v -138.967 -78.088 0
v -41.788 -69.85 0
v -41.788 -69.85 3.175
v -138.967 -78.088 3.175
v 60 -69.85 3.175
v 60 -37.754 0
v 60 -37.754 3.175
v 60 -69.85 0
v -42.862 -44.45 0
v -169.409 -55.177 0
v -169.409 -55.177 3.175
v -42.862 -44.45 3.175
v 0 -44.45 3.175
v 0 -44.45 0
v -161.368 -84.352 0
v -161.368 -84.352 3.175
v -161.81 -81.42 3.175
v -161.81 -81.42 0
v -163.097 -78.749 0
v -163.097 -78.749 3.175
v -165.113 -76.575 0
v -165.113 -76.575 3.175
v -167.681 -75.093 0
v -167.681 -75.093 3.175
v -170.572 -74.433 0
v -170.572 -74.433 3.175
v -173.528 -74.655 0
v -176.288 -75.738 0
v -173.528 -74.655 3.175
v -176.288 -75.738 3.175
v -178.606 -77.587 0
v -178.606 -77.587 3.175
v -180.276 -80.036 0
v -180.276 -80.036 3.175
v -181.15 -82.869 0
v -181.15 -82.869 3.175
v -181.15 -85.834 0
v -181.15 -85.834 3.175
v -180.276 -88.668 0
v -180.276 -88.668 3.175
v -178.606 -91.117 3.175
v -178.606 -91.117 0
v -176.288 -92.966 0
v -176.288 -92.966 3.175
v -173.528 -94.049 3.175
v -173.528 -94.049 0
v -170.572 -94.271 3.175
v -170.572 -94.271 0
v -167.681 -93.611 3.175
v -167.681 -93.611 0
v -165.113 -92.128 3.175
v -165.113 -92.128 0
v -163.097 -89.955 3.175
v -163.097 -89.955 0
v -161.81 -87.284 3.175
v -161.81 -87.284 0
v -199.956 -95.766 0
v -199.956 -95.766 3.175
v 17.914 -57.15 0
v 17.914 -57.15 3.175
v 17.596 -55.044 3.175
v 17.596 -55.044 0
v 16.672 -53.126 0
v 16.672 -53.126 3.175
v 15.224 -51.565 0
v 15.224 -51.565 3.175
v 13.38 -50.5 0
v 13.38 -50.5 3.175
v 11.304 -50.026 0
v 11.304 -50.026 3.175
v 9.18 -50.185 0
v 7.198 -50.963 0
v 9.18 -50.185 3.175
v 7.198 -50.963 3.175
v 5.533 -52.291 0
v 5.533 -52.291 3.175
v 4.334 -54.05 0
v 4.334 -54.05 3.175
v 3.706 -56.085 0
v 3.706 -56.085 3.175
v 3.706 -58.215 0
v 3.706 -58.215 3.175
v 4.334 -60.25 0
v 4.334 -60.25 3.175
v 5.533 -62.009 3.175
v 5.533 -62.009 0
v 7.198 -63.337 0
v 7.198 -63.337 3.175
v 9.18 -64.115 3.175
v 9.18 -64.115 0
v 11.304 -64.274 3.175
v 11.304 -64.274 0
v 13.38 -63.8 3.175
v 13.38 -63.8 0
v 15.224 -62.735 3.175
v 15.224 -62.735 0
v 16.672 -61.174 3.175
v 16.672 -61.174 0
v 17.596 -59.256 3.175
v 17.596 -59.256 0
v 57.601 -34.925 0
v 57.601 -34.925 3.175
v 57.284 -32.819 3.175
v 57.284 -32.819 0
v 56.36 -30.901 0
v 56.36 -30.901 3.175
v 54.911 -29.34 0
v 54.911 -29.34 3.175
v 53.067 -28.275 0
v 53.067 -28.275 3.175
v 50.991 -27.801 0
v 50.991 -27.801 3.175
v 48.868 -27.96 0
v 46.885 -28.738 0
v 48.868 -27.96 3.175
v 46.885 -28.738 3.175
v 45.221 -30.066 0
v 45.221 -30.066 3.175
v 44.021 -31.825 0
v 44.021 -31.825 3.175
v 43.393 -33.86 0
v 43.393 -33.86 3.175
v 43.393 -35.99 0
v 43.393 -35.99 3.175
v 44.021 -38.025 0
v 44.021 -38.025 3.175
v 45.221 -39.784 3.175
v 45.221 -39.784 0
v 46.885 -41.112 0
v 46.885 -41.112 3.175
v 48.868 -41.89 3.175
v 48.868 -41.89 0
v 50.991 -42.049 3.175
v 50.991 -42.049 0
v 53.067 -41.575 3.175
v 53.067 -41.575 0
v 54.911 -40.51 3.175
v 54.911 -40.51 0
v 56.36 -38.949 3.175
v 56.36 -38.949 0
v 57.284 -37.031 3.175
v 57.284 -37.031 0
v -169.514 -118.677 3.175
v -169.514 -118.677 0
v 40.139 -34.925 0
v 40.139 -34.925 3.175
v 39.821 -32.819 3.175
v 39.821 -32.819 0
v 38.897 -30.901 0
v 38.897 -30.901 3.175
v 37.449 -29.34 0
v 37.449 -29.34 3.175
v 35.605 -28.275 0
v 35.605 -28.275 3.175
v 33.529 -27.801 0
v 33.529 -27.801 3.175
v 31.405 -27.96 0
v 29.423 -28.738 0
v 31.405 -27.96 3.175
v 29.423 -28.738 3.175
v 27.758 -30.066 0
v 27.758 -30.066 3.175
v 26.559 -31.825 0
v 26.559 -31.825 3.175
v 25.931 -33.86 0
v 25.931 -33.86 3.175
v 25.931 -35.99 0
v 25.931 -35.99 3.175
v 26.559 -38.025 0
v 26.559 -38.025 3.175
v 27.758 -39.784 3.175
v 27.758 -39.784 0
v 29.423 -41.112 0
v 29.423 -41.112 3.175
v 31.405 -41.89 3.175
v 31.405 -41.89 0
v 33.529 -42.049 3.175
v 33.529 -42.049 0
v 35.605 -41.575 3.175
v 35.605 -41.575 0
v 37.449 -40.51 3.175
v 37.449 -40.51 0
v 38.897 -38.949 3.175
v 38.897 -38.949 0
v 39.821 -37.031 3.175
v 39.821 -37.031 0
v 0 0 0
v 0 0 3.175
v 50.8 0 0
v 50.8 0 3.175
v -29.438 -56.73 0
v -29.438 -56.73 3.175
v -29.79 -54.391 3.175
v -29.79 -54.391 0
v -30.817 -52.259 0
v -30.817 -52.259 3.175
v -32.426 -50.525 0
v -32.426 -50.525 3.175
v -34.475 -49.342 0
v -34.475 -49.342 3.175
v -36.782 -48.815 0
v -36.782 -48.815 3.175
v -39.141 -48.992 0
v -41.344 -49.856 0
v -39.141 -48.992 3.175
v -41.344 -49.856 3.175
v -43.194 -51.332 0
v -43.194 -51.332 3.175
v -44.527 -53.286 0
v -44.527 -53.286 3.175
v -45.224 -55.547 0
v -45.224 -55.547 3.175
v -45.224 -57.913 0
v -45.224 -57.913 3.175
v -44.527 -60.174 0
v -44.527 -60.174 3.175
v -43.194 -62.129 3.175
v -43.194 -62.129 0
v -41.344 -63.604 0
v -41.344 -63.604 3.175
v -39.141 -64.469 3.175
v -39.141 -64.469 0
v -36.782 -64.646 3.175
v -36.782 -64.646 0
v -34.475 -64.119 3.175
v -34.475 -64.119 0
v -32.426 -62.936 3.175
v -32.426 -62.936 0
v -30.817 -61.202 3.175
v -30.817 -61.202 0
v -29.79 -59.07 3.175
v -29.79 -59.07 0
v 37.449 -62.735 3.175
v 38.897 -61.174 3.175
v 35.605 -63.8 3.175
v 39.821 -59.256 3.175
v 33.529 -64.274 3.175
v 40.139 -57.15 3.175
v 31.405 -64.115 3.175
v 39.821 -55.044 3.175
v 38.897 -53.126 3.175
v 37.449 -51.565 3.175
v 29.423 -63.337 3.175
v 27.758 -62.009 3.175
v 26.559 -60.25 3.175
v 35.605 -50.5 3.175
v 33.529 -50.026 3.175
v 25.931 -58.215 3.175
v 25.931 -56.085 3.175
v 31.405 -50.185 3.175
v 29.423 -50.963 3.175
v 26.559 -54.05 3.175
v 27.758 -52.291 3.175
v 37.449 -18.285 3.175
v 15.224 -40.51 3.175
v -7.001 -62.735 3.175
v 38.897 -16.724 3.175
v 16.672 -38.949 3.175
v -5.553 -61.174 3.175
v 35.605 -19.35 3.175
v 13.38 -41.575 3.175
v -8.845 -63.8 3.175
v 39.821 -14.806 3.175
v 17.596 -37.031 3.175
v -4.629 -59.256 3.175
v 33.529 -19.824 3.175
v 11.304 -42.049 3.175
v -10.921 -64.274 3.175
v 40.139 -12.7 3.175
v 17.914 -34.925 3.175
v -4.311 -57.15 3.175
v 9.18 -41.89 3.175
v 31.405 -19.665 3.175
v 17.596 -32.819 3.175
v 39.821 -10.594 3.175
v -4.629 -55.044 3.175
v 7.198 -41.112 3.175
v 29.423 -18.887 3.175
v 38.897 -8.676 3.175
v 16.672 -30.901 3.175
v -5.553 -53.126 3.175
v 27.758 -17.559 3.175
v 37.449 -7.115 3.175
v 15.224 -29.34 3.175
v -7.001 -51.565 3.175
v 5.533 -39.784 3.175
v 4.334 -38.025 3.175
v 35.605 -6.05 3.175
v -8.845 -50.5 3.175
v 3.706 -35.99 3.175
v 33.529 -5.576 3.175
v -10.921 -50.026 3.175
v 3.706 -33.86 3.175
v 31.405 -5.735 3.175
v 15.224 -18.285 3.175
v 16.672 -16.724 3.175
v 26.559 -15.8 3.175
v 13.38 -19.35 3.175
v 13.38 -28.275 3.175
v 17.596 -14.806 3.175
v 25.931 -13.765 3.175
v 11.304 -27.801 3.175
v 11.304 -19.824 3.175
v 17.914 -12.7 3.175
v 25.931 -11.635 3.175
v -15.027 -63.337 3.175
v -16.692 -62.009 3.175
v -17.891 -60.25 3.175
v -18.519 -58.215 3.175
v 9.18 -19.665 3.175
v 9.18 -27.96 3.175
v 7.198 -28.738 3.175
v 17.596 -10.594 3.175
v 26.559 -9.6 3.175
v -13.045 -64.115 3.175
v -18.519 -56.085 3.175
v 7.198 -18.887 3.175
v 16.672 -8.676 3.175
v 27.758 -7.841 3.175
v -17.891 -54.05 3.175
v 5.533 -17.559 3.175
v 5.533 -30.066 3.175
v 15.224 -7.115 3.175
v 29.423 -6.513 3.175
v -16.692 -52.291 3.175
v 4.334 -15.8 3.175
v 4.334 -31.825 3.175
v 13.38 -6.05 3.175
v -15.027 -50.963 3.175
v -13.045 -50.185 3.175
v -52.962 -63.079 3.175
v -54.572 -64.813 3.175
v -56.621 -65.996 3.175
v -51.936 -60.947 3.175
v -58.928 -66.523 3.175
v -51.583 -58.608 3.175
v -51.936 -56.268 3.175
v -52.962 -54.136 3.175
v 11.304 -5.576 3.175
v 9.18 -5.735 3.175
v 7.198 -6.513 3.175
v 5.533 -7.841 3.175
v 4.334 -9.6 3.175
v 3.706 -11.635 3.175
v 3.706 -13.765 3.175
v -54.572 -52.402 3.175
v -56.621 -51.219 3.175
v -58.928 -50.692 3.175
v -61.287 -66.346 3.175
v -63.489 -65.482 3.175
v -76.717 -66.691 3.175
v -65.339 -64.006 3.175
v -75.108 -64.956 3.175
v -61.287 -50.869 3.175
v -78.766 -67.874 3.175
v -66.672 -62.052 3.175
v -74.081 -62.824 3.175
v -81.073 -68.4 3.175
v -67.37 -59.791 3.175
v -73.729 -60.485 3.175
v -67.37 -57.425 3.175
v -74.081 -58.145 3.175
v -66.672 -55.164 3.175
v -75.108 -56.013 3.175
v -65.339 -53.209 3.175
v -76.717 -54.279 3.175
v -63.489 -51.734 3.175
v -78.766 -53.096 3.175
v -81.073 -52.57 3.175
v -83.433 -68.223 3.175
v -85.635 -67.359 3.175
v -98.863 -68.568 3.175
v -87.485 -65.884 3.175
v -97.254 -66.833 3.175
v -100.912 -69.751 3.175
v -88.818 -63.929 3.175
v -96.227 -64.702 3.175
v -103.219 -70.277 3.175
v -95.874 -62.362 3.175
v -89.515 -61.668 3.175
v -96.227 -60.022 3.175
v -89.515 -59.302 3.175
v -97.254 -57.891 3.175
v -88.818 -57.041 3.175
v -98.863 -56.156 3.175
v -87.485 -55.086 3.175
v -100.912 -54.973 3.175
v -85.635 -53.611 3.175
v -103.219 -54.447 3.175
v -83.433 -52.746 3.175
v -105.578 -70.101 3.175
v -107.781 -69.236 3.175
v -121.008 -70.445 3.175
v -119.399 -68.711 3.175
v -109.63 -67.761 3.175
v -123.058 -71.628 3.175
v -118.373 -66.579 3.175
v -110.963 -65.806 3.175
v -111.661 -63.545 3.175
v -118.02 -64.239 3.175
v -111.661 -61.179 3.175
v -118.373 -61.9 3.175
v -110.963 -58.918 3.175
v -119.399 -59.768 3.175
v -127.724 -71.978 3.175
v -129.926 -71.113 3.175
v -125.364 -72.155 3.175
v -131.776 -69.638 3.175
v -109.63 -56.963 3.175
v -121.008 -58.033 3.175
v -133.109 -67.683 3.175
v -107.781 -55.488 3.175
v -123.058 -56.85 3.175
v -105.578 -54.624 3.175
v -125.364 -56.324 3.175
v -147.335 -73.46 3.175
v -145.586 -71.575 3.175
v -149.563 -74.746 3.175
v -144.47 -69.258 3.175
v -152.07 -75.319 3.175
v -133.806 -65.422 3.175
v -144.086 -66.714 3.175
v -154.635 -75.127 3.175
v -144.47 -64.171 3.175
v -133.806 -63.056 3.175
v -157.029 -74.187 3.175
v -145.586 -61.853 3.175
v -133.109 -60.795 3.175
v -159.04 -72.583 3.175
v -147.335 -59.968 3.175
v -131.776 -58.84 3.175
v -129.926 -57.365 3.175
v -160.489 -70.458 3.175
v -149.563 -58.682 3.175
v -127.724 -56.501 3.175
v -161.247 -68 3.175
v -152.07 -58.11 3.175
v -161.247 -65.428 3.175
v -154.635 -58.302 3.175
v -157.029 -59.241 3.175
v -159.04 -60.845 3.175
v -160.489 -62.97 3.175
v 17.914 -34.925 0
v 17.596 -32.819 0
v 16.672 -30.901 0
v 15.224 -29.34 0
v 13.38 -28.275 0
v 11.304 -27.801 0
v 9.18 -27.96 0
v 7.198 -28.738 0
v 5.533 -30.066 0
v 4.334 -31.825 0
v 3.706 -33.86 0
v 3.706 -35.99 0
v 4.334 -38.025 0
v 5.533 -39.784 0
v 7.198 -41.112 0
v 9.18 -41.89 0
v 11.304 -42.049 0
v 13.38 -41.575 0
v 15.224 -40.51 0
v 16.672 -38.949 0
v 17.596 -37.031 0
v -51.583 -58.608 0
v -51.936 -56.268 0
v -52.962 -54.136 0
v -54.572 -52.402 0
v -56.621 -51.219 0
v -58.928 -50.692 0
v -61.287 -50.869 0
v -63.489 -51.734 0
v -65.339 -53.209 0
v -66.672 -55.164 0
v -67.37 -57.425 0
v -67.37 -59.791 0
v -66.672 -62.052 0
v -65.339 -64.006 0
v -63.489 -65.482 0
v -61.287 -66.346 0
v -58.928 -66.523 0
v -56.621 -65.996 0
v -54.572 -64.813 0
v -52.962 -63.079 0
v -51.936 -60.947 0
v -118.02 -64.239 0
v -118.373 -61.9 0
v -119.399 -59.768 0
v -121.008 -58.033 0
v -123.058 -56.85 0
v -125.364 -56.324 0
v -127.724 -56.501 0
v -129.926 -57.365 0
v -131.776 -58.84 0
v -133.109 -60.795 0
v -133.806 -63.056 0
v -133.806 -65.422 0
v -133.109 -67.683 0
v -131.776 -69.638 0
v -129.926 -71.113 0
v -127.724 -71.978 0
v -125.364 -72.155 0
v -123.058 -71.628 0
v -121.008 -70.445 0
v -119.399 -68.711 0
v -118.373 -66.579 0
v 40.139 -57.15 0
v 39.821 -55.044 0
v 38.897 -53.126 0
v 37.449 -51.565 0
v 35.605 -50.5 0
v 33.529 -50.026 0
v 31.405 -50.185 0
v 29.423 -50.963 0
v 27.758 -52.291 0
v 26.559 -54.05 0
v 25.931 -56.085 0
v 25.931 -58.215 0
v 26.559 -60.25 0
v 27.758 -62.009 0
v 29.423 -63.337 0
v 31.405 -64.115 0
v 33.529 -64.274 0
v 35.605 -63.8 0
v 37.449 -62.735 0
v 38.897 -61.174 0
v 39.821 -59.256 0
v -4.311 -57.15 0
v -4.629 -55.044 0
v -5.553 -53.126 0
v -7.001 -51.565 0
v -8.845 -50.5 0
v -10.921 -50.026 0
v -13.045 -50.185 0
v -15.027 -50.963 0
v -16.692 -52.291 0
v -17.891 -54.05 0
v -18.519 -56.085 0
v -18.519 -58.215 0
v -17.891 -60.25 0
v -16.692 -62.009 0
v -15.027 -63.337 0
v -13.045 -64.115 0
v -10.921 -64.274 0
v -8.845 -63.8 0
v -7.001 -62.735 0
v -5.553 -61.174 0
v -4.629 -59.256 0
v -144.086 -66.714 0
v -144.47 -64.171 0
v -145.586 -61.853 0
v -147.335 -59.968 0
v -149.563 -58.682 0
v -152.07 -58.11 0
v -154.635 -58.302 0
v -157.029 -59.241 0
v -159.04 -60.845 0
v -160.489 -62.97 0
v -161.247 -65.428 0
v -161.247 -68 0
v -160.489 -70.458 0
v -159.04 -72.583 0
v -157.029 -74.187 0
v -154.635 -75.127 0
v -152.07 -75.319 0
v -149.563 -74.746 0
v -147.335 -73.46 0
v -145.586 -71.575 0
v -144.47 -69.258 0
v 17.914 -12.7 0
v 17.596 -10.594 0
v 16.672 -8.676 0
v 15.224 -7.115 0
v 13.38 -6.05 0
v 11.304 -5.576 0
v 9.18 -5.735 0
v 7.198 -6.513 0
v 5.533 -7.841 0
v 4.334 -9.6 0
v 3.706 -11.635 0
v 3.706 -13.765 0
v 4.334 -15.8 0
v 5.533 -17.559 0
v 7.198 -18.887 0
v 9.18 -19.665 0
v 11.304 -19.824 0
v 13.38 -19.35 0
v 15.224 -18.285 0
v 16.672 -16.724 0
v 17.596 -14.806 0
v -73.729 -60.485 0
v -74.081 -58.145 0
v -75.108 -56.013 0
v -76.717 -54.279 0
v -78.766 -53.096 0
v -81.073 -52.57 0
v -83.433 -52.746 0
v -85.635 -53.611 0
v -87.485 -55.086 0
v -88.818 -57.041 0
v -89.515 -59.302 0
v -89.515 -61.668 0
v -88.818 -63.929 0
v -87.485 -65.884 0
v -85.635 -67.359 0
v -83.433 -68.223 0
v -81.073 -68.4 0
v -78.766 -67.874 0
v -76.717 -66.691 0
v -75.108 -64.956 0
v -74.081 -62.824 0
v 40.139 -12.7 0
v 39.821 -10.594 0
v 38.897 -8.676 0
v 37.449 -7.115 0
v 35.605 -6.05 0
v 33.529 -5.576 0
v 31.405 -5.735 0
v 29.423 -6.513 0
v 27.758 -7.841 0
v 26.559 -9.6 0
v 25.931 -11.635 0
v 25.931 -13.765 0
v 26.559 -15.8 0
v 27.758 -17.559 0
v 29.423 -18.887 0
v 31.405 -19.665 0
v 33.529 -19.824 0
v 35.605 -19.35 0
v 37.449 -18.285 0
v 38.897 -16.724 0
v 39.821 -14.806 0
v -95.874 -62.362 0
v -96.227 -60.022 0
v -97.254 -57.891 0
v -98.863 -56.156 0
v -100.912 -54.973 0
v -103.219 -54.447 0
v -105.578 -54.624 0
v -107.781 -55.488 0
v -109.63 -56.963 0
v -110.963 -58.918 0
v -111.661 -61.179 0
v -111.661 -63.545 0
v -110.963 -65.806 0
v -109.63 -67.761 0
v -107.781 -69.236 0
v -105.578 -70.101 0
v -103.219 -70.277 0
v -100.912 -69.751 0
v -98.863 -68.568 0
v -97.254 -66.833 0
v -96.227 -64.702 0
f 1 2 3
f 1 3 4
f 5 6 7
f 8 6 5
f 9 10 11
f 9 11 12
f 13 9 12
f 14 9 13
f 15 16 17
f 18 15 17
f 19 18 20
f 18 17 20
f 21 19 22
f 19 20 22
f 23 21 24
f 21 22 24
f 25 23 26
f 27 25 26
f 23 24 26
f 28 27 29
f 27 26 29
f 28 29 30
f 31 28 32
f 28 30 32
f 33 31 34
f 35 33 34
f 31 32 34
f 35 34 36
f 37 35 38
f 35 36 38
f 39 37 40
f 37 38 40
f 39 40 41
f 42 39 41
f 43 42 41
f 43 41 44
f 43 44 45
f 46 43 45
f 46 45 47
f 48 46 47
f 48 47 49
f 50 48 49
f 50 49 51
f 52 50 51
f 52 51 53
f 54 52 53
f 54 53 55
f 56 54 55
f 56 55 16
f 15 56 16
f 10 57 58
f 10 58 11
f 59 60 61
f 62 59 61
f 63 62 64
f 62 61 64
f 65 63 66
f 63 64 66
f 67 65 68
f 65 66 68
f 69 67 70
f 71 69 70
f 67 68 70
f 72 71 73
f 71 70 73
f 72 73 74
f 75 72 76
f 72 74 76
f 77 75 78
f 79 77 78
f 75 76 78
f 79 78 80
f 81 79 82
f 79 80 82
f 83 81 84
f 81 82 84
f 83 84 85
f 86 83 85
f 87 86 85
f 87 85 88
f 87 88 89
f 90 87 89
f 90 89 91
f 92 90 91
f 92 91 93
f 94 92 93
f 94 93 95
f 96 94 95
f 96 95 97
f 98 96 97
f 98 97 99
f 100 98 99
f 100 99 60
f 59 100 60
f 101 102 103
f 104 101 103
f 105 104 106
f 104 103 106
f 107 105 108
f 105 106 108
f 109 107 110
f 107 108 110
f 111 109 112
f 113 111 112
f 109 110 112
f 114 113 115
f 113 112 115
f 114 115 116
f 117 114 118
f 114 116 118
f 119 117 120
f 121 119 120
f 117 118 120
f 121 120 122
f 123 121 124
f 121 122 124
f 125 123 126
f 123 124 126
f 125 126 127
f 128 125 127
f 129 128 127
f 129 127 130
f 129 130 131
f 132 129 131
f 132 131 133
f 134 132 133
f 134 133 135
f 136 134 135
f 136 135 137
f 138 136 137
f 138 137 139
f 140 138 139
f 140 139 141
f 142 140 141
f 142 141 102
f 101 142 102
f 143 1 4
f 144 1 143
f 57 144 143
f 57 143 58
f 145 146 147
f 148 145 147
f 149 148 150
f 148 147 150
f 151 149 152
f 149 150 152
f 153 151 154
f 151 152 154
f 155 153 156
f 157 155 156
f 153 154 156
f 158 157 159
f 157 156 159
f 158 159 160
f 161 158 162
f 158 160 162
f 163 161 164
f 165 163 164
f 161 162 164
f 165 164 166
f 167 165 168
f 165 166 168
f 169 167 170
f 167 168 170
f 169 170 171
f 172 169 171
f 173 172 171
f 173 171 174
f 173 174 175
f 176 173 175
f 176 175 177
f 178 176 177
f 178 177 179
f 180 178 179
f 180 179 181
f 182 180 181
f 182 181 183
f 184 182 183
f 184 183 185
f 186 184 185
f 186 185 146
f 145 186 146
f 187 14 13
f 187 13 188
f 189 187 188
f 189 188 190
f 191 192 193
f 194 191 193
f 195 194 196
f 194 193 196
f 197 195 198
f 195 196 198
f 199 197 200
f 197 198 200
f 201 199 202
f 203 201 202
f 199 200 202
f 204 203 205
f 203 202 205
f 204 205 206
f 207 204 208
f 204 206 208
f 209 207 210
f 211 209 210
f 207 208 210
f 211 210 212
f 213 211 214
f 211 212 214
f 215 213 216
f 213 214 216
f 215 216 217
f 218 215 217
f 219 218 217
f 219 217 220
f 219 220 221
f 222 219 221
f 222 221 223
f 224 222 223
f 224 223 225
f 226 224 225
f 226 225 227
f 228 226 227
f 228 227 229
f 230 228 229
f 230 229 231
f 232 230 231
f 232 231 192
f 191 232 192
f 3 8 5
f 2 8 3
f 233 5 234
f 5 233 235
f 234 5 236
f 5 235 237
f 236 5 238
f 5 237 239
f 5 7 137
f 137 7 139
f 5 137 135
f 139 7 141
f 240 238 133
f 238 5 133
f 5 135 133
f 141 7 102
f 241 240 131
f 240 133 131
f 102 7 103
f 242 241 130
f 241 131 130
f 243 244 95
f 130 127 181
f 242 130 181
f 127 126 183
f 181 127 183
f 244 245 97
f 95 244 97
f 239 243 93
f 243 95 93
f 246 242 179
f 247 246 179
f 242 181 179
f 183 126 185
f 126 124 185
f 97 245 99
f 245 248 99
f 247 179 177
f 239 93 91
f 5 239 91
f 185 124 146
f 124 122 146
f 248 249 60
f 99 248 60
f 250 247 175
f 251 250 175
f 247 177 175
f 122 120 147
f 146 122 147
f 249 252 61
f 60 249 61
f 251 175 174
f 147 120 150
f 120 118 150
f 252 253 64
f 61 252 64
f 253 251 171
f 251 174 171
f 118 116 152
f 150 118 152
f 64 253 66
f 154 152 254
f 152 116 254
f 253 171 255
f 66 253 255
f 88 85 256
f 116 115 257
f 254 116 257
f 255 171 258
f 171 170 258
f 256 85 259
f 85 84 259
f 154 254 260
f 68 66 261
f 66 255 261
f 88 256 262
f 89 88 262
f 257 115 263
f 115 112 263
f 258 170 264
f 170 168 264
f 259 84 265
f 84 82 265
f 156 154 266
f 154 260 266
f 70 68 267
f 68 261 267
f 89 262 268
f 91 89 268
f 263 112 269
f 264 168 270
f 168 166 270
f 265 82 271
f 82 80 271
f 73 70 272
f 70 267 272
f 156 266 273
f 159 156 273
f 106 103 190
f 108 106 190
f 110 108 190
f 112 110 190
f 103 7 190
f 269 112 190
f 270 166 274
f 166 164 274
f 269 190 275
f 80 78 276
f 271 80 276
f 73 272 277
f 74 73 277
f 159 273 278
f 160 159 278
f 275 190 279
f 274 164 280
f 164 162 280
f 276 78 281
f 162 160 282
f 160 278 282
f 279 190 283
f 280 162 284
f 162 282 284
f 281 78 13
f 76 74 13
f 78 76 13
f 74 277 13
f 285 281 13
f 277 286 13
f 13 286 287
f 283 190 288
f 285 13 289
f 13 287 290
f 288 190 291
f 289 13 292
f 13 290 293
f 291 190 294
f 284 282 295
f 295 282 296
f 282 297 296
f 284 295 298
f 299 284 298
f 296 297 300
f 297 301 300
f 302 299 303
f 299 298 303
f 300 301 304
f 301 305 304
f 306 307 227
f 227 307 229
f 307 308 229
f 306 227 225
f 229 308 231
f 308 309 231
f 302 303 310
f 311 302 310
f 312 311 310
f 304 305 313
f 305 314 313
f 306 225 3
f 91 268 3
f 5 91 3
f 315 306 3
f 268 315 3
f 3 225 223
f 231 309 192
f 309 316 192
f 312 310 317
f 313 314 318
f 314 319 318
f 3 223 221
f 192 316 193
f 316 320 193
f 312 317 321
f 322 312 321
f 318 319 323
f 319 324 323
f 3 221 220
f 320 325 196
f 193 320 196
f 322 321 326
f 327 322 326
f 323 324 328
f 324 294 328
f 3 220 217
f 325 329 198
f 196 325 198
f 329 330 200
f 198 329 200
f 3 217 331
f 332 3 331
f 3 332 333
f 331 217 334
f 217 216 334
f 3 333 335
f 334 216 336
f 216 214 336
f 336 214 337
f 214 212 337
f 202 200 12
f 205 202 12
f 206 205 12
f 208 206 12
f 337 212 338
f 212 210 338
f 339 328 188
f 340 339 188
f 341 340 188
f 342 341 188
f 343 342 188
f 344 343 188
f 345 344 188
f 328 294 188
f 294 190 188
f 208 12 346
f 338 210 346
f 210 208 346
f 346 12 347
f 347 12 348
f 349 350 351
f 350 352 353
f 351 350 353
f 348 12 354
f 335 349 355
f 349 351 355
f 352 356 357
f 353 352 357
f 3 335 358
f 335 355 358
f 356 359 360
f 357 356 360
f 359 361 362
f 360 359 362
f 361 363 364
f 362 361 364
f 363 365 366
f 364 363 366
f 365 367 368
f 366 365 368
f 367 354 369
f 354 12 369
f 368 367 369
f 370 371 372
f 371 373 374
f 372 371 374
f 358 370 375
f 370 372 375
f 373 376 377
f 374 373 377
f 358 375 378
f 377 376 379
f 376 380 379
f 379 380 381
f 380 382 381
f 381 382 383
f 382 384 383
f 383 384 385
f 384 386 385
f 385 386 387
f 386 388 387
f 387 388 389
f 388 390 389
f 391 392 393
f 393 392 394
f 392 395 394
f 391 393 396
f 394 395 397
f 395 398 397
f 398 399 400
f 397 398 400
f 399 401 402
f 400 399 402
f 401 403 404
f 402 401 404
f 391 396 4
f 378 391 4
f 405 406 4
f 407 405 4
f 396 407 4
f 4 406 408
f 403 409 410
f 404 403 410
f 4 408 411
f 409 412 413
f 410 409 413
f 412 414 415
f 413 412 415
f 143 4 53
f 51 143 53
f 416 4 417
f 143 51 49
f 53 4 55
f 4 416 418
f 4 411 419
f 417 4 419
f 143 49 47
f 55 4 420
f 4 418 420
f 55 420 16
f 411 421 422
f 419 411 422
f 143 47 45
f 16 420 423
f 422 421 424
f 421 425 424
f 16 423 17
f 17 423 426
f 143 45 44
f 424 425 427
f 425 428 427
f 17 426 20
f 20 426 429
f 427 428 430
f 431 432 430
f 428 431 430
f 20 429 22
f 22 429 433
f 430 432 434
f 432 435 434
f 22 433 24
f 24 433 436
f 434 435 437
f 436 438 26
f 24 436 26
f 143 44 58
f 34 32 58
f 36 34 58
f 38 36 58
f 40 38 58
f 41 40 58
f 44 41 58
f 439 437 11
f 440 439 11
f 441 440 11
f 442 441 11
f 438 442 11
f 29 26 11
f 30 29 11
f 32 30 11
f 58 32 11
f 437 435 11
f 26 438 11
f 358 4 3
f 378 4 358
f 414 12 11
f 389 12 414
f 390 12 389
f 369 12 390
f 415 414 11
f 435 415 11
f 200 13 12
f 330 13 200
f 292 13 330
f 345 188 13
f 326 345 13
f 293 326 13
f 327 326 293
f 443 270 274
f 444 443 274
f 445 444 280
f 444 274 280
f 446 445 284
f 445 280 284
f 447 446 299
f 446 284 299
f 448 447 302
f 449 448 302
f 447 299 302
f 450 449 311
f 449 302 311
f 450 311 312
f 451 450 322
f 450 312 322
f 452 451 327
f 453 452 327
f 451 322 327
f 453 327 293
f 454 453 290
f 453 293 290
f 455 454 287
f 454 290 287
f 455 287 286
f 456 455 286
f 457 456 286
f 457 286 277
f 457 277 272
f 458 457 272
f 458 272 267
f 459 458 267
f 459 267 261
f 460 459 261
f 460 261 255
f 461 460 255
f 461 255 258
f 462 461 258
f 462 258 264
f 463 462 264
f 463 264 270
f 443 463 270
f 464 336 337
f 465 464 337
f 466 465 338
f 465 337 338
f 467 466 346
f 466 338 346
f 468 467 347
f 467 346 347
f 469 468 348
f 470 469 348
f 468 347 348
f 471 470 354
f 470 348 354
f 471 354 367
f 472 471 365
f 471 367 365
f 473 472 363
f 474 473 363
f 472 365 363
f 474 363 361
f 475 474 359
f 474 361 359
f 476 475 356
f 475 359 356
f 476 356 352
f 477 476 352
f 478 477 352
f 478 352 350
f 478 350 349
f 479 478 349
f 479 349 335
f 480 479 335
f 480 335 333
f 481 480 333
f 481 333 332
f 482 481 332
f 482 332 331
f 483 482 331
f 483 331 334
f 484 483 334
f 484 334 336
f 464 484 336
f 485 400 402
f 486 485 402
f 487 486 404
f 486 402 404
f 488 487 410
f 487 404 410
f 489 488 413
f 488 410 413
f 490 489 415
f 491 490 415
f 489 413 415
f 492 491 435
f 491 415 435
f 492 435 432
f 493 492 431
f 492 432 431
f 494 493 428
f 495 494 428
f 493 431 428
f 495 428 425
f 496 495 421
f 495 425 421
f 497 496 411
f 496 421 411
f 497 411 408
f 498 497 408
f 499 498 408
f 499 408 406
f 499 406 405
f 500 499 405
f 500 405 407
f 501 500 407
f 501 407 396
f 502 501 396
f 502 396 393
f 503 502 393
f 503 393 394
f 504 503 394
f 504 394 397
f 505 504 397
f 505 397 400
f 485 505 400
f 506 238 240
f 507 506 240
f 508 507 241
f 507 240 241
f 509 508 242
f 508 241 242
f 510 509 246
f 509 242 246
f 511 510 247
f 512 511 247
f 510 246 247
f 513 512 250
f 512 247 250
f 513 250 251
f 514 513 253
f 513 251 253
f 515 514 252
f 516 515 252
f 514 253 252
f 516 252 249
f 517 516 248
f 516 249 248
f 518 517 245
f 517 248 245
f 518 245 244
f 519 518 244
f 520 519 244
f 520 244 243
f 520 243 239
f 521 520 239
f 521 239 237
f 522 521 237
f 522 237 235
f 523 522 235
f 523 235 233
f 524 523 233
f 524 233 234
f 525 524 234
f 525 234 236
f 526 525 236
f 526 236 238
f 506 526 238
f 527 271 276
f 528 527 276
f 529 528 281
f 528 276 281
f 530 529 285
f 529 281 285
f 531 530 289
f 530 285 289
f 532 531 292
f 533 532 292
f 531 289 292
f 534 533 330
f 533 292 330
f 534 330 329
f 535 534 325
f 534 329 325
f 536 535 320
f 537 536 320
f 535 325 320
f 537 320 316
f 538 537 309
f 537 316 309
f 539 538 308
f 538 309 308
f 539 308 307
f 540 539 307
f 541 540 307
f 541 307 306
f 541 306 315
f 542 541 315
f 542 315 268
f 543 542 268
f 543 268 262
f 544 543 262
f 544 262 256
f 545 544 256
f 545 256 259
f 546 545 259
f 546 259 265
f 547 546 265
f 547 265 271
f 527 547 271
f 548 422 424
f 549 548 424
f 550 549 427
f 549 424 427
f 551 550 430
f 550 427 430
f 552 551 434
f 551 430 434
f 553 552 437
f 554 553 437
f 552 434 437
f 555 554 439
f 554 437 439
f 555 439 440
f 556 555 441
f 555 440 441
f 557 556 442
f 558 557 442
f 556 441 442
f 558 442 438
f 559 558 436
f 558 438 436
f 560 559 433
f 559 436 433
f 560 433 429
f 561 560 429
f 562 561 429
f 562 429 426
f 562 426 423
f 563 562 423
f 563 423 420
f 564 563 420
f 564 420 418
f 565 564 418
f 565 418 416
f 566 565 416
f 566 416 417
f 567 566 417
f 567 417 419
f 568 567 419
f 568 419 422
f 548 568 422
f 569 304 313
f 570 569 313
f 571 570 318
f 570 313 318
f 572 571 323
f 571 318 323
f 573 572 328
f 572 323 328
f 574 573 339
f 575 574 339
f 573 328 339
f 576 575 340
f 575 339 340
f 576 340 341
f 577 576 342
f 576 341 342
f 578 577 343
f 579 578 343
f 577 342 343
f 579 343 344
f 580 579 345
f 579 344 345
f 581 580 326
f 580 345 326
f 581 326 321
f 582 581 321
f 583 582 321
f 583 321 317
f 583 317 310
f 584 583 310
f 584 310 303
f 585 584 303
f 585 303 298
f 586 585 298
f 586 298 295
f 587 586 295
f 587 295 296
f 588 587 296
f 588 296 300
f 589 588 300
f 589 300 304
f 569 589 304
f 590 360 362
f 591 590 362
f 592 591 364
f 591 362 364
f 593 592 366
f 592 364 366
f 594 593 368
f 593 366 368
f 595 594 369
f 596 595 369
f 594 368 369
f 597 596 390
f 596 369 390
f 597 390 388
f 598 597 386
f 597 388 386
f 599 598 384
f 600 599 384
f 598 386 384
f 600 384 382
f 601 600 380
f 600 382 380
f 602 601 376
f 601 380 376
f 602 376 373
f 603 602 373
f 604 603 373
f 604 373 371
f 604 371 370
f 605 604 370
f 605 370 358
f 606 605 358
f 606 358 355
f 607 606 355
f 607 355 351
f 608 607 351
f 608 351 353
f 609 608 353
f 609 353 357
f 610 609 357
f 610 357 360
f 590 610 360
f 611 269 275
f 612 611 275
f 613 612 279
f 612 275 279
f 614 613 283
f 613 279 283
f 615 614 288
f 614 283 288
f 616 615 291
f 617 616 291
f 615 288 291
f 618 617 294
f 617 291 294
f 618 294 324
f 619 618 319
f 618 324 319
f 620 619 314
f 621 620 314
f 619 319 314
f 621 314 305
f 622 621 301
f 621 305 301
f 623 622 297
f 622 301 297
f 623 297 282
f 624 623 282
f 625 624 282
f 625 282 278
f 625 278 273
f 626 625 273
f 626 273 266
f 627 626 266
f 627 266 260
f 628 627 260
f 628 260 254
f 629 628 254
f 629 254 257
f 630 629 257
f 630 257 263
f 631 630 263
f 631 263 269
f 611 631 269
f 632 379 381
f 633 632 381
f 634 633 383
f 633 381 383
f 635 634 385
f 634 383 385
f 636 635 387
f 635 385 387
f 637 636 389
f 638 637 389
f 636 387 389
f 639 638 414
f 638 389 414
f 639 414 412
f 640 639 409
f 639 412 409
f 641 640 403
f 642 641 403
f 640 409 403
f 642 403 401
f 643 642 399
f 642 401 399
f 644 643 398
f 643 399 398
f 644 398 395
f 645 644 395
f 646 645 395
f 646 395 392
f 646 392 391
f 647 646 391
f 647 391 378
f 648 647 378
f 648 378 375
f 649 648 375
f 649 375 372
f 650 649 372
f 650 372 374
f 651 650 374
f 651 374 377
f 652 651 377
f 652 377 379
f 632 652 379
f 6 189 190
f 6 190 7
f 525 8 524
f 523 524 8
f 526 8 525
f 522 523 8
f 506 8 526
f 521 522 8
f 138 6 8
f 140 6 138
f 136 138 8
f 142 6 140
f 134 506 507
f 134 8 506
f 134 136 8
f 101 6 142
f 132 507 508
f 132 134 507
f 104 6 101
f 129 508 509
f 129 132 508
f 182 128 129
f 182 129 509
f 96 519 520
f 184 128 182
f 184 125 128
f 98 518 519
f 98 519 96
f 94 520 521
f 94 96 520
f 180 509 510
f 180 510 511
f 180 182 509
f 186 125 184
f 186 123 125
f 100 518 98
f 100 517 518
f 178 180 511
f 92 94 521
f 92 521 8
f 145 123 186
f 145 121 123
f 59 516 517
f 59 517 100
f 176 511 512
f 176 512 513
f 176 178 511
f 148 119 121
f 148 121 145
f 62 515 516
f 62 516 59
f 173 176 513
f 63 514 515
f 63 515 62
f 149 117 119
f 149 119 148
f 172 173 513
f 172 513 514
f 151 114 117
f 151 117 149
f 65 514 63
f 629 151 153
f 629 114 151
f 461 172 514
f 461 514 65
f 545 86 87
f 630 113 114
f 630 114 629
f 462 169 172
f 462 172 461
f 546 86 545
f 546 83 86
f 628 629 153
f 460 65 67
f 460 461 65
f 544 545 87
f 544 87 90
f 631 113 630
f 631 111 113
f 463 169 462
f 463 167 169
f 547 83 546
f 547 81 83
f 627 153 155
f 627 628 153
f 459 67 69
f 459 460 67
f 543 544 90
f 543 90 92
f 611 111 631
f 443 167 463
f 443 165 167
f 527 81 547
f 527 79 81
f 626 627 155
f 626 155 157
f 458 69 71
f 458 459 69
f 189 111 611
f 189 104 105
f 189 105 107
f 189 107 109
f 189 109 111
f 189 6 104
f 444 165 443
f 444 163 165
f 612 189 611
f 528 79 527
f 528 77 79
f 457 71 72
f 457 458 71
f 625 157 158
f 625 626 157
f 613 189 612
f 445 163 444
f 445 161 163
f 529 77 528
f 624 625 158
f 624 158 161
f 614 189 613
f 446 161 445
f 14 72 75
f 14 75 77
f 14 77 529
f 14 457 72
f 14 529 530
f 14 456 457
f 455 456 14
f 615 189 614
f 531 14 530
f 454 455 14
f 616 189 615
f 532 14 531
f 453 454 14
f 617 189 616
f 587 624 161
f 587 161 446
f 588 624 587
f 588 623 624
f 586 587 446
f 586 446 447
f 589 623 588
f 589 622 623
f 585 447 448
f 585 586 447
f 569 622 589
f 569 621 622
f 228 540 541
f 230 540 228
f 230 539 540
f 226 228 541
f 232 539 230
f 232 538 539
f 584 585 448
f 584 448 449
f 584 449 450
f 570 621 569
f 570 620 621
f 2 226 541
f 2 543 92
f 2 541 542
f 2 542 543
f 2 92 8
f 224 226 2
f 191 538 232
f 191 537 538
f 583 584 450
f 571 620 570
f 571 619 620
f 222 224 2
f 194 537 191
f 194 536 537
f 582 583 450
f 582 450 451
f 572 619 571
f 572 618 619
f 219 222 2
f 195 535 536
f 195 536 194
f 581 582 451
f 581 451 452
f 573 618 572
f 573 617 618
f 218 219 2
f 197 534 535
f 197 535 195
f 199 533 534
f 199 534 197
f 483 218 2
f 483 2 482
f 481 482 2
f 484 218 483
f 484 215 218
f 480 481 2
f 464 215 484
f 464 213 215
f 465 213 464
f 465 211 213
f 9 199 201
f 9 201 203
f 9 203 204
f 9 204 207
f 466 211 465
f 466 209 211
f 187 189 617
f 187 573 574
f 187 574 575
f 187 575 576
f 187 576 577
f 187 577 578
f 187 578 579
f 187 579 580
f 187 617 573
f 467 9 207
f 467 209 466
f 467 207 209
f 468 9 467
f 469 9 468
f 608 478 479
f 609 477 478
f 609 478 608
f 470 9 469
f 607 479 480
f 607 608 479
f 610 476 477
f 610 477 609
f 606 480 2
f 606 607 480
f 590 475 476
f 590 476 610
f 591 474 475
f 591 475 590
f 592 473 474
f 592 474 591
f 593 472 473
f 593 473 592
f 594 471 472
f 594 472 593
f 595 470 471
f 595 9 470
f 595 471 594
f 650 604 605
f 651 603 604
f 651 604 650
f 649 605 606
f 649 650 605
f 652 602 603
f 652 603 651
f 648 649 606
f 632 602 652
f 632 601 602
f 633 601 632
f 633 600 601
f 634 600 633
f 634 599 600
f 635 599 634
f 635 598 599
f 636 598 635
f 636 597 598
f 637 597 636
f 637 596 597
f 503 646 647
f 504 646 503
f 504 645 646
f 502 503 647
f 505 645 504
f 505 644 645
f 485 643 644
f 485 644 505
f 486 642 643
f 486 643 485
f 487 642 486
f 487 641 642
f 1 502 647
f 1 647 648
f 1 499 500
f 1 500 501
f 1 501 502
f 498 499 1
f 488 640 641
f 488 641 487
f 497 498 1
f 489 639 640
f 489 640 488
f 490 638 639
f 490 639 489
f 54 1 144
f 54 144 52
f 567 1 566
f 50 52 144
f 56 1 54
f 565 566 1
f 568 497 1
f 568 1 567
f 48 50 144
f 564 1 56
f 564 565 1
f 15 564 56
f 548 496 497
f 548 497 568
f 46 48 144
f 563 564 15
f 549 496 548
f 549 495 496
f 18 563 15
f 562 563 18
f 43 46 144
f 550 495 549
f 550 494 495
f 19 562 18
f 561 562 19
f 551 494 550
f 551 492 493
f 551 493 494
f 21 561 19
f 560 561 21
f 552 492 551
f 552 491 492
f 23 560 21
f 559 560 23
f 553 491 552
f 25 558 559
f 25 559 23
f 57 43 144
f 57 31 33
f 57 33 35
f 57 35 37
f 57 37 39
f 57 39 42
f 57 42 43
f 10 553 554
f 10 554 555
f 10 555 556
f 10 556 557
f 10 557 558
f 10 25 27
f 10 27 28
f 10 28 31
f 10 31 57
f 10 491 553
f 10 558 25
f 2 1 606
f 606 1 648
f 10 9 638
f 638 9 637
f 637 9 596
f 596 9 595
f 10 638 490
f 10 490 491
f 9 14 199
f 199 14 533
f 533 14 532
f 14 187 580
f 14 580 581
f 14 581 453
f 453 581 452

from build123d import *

# Parameters (mm, degrees)
BOSS_EXTRUDE1_DEPTH = 3.175
SKETCH2_R           = 9.946432709
SKETCH2_R_2         = 8.628774031
SKETCH2_R_3         = 7.9375
SKETCH2_R_4         = 7.14375
CUT_EXTRUDE1_DEPTH  = 4.175


with BuildPart() as part:
    # Sketch1 → Boss-Extrude1 (new body)
    with BuildSketch(Plane.XY):
        Polygon((0, 0), (50.8, 0), (60, -37.754085603), (60, -69.85), (-41.787887726, -69.85), (-138.966701689, -78.087543548), (-169.514196693, -118.67683461), (-199.95616499, -95.766213357), (-169.408669986, -55.176922294), (-42.8625, -44.45), (0, -44.45), align=None)
    extrude(amount=BOSS_EXTRUDE1_DEPTH)

    # Sketch2 → Cut-Extrude1 (cut, through all)
    with BuildSketch(Plane.XY.offset(3.175)):
        with Locations((-171.31481468, -84.35191449)):
            Circle(SKETCH2_R)
        with Locations((-152.715034722, -66.714192116)):
            Circle(SKETCH2_R_2)
        with Locations((-125.957448531, -64.239244165)):
            Circle(SKETCH2_R_3)
        with Locations((-103.811868784, -62.362032763)):
            Circle(SKETCH2_R_3)
        with Locations((-81.666289037, -60.484821362)):
            Circle(SKETCH2_R_3)
        with Locations((-59.52070929, -58.60760996)):
            Circle(SKETCH2_R_3)
        with Locations((-37.375129542, -56.730398559)):
            Circle(SKETCH2_R_3)
        with Locations((-11.455180712, -57.15)):
            Circle(SKETCH2_R_4)
        with Locations((10.769819288, -57.15)):
            Circle(SKETCH2_R_4)
        with Locations((32.994819288, -57.15)):
            Circle(SKETCH2_R_4)
        with Locations((10.769819288, -34.925)):
            Circle(SKETCH2_R_4)
        with Locations((32.994819288, -34.925)):
            Circle(SKETCH2_R_4)
        with Locations((10.769819288, -12.7)):
            Circle(SKETCH2_R_4)
        with Locations((32.994819288, -12.7)):
            Circle(SKETCH2_R_4)
        with Locations((-11.455180712, -34.925)):
            Circle(SKETCH2_R_4)
        with Locations((-11.455180712, -12.7)):
            Circle(SKETCH2_R_4)
        with Locations((50.457319288, -34.925)):
            Circle(SKETCH2_R_4)
    extrude(amount=-CUT_EXTRUDE1_DEPTH, mode=Mode.SUBTRACT)


solid = part.part
